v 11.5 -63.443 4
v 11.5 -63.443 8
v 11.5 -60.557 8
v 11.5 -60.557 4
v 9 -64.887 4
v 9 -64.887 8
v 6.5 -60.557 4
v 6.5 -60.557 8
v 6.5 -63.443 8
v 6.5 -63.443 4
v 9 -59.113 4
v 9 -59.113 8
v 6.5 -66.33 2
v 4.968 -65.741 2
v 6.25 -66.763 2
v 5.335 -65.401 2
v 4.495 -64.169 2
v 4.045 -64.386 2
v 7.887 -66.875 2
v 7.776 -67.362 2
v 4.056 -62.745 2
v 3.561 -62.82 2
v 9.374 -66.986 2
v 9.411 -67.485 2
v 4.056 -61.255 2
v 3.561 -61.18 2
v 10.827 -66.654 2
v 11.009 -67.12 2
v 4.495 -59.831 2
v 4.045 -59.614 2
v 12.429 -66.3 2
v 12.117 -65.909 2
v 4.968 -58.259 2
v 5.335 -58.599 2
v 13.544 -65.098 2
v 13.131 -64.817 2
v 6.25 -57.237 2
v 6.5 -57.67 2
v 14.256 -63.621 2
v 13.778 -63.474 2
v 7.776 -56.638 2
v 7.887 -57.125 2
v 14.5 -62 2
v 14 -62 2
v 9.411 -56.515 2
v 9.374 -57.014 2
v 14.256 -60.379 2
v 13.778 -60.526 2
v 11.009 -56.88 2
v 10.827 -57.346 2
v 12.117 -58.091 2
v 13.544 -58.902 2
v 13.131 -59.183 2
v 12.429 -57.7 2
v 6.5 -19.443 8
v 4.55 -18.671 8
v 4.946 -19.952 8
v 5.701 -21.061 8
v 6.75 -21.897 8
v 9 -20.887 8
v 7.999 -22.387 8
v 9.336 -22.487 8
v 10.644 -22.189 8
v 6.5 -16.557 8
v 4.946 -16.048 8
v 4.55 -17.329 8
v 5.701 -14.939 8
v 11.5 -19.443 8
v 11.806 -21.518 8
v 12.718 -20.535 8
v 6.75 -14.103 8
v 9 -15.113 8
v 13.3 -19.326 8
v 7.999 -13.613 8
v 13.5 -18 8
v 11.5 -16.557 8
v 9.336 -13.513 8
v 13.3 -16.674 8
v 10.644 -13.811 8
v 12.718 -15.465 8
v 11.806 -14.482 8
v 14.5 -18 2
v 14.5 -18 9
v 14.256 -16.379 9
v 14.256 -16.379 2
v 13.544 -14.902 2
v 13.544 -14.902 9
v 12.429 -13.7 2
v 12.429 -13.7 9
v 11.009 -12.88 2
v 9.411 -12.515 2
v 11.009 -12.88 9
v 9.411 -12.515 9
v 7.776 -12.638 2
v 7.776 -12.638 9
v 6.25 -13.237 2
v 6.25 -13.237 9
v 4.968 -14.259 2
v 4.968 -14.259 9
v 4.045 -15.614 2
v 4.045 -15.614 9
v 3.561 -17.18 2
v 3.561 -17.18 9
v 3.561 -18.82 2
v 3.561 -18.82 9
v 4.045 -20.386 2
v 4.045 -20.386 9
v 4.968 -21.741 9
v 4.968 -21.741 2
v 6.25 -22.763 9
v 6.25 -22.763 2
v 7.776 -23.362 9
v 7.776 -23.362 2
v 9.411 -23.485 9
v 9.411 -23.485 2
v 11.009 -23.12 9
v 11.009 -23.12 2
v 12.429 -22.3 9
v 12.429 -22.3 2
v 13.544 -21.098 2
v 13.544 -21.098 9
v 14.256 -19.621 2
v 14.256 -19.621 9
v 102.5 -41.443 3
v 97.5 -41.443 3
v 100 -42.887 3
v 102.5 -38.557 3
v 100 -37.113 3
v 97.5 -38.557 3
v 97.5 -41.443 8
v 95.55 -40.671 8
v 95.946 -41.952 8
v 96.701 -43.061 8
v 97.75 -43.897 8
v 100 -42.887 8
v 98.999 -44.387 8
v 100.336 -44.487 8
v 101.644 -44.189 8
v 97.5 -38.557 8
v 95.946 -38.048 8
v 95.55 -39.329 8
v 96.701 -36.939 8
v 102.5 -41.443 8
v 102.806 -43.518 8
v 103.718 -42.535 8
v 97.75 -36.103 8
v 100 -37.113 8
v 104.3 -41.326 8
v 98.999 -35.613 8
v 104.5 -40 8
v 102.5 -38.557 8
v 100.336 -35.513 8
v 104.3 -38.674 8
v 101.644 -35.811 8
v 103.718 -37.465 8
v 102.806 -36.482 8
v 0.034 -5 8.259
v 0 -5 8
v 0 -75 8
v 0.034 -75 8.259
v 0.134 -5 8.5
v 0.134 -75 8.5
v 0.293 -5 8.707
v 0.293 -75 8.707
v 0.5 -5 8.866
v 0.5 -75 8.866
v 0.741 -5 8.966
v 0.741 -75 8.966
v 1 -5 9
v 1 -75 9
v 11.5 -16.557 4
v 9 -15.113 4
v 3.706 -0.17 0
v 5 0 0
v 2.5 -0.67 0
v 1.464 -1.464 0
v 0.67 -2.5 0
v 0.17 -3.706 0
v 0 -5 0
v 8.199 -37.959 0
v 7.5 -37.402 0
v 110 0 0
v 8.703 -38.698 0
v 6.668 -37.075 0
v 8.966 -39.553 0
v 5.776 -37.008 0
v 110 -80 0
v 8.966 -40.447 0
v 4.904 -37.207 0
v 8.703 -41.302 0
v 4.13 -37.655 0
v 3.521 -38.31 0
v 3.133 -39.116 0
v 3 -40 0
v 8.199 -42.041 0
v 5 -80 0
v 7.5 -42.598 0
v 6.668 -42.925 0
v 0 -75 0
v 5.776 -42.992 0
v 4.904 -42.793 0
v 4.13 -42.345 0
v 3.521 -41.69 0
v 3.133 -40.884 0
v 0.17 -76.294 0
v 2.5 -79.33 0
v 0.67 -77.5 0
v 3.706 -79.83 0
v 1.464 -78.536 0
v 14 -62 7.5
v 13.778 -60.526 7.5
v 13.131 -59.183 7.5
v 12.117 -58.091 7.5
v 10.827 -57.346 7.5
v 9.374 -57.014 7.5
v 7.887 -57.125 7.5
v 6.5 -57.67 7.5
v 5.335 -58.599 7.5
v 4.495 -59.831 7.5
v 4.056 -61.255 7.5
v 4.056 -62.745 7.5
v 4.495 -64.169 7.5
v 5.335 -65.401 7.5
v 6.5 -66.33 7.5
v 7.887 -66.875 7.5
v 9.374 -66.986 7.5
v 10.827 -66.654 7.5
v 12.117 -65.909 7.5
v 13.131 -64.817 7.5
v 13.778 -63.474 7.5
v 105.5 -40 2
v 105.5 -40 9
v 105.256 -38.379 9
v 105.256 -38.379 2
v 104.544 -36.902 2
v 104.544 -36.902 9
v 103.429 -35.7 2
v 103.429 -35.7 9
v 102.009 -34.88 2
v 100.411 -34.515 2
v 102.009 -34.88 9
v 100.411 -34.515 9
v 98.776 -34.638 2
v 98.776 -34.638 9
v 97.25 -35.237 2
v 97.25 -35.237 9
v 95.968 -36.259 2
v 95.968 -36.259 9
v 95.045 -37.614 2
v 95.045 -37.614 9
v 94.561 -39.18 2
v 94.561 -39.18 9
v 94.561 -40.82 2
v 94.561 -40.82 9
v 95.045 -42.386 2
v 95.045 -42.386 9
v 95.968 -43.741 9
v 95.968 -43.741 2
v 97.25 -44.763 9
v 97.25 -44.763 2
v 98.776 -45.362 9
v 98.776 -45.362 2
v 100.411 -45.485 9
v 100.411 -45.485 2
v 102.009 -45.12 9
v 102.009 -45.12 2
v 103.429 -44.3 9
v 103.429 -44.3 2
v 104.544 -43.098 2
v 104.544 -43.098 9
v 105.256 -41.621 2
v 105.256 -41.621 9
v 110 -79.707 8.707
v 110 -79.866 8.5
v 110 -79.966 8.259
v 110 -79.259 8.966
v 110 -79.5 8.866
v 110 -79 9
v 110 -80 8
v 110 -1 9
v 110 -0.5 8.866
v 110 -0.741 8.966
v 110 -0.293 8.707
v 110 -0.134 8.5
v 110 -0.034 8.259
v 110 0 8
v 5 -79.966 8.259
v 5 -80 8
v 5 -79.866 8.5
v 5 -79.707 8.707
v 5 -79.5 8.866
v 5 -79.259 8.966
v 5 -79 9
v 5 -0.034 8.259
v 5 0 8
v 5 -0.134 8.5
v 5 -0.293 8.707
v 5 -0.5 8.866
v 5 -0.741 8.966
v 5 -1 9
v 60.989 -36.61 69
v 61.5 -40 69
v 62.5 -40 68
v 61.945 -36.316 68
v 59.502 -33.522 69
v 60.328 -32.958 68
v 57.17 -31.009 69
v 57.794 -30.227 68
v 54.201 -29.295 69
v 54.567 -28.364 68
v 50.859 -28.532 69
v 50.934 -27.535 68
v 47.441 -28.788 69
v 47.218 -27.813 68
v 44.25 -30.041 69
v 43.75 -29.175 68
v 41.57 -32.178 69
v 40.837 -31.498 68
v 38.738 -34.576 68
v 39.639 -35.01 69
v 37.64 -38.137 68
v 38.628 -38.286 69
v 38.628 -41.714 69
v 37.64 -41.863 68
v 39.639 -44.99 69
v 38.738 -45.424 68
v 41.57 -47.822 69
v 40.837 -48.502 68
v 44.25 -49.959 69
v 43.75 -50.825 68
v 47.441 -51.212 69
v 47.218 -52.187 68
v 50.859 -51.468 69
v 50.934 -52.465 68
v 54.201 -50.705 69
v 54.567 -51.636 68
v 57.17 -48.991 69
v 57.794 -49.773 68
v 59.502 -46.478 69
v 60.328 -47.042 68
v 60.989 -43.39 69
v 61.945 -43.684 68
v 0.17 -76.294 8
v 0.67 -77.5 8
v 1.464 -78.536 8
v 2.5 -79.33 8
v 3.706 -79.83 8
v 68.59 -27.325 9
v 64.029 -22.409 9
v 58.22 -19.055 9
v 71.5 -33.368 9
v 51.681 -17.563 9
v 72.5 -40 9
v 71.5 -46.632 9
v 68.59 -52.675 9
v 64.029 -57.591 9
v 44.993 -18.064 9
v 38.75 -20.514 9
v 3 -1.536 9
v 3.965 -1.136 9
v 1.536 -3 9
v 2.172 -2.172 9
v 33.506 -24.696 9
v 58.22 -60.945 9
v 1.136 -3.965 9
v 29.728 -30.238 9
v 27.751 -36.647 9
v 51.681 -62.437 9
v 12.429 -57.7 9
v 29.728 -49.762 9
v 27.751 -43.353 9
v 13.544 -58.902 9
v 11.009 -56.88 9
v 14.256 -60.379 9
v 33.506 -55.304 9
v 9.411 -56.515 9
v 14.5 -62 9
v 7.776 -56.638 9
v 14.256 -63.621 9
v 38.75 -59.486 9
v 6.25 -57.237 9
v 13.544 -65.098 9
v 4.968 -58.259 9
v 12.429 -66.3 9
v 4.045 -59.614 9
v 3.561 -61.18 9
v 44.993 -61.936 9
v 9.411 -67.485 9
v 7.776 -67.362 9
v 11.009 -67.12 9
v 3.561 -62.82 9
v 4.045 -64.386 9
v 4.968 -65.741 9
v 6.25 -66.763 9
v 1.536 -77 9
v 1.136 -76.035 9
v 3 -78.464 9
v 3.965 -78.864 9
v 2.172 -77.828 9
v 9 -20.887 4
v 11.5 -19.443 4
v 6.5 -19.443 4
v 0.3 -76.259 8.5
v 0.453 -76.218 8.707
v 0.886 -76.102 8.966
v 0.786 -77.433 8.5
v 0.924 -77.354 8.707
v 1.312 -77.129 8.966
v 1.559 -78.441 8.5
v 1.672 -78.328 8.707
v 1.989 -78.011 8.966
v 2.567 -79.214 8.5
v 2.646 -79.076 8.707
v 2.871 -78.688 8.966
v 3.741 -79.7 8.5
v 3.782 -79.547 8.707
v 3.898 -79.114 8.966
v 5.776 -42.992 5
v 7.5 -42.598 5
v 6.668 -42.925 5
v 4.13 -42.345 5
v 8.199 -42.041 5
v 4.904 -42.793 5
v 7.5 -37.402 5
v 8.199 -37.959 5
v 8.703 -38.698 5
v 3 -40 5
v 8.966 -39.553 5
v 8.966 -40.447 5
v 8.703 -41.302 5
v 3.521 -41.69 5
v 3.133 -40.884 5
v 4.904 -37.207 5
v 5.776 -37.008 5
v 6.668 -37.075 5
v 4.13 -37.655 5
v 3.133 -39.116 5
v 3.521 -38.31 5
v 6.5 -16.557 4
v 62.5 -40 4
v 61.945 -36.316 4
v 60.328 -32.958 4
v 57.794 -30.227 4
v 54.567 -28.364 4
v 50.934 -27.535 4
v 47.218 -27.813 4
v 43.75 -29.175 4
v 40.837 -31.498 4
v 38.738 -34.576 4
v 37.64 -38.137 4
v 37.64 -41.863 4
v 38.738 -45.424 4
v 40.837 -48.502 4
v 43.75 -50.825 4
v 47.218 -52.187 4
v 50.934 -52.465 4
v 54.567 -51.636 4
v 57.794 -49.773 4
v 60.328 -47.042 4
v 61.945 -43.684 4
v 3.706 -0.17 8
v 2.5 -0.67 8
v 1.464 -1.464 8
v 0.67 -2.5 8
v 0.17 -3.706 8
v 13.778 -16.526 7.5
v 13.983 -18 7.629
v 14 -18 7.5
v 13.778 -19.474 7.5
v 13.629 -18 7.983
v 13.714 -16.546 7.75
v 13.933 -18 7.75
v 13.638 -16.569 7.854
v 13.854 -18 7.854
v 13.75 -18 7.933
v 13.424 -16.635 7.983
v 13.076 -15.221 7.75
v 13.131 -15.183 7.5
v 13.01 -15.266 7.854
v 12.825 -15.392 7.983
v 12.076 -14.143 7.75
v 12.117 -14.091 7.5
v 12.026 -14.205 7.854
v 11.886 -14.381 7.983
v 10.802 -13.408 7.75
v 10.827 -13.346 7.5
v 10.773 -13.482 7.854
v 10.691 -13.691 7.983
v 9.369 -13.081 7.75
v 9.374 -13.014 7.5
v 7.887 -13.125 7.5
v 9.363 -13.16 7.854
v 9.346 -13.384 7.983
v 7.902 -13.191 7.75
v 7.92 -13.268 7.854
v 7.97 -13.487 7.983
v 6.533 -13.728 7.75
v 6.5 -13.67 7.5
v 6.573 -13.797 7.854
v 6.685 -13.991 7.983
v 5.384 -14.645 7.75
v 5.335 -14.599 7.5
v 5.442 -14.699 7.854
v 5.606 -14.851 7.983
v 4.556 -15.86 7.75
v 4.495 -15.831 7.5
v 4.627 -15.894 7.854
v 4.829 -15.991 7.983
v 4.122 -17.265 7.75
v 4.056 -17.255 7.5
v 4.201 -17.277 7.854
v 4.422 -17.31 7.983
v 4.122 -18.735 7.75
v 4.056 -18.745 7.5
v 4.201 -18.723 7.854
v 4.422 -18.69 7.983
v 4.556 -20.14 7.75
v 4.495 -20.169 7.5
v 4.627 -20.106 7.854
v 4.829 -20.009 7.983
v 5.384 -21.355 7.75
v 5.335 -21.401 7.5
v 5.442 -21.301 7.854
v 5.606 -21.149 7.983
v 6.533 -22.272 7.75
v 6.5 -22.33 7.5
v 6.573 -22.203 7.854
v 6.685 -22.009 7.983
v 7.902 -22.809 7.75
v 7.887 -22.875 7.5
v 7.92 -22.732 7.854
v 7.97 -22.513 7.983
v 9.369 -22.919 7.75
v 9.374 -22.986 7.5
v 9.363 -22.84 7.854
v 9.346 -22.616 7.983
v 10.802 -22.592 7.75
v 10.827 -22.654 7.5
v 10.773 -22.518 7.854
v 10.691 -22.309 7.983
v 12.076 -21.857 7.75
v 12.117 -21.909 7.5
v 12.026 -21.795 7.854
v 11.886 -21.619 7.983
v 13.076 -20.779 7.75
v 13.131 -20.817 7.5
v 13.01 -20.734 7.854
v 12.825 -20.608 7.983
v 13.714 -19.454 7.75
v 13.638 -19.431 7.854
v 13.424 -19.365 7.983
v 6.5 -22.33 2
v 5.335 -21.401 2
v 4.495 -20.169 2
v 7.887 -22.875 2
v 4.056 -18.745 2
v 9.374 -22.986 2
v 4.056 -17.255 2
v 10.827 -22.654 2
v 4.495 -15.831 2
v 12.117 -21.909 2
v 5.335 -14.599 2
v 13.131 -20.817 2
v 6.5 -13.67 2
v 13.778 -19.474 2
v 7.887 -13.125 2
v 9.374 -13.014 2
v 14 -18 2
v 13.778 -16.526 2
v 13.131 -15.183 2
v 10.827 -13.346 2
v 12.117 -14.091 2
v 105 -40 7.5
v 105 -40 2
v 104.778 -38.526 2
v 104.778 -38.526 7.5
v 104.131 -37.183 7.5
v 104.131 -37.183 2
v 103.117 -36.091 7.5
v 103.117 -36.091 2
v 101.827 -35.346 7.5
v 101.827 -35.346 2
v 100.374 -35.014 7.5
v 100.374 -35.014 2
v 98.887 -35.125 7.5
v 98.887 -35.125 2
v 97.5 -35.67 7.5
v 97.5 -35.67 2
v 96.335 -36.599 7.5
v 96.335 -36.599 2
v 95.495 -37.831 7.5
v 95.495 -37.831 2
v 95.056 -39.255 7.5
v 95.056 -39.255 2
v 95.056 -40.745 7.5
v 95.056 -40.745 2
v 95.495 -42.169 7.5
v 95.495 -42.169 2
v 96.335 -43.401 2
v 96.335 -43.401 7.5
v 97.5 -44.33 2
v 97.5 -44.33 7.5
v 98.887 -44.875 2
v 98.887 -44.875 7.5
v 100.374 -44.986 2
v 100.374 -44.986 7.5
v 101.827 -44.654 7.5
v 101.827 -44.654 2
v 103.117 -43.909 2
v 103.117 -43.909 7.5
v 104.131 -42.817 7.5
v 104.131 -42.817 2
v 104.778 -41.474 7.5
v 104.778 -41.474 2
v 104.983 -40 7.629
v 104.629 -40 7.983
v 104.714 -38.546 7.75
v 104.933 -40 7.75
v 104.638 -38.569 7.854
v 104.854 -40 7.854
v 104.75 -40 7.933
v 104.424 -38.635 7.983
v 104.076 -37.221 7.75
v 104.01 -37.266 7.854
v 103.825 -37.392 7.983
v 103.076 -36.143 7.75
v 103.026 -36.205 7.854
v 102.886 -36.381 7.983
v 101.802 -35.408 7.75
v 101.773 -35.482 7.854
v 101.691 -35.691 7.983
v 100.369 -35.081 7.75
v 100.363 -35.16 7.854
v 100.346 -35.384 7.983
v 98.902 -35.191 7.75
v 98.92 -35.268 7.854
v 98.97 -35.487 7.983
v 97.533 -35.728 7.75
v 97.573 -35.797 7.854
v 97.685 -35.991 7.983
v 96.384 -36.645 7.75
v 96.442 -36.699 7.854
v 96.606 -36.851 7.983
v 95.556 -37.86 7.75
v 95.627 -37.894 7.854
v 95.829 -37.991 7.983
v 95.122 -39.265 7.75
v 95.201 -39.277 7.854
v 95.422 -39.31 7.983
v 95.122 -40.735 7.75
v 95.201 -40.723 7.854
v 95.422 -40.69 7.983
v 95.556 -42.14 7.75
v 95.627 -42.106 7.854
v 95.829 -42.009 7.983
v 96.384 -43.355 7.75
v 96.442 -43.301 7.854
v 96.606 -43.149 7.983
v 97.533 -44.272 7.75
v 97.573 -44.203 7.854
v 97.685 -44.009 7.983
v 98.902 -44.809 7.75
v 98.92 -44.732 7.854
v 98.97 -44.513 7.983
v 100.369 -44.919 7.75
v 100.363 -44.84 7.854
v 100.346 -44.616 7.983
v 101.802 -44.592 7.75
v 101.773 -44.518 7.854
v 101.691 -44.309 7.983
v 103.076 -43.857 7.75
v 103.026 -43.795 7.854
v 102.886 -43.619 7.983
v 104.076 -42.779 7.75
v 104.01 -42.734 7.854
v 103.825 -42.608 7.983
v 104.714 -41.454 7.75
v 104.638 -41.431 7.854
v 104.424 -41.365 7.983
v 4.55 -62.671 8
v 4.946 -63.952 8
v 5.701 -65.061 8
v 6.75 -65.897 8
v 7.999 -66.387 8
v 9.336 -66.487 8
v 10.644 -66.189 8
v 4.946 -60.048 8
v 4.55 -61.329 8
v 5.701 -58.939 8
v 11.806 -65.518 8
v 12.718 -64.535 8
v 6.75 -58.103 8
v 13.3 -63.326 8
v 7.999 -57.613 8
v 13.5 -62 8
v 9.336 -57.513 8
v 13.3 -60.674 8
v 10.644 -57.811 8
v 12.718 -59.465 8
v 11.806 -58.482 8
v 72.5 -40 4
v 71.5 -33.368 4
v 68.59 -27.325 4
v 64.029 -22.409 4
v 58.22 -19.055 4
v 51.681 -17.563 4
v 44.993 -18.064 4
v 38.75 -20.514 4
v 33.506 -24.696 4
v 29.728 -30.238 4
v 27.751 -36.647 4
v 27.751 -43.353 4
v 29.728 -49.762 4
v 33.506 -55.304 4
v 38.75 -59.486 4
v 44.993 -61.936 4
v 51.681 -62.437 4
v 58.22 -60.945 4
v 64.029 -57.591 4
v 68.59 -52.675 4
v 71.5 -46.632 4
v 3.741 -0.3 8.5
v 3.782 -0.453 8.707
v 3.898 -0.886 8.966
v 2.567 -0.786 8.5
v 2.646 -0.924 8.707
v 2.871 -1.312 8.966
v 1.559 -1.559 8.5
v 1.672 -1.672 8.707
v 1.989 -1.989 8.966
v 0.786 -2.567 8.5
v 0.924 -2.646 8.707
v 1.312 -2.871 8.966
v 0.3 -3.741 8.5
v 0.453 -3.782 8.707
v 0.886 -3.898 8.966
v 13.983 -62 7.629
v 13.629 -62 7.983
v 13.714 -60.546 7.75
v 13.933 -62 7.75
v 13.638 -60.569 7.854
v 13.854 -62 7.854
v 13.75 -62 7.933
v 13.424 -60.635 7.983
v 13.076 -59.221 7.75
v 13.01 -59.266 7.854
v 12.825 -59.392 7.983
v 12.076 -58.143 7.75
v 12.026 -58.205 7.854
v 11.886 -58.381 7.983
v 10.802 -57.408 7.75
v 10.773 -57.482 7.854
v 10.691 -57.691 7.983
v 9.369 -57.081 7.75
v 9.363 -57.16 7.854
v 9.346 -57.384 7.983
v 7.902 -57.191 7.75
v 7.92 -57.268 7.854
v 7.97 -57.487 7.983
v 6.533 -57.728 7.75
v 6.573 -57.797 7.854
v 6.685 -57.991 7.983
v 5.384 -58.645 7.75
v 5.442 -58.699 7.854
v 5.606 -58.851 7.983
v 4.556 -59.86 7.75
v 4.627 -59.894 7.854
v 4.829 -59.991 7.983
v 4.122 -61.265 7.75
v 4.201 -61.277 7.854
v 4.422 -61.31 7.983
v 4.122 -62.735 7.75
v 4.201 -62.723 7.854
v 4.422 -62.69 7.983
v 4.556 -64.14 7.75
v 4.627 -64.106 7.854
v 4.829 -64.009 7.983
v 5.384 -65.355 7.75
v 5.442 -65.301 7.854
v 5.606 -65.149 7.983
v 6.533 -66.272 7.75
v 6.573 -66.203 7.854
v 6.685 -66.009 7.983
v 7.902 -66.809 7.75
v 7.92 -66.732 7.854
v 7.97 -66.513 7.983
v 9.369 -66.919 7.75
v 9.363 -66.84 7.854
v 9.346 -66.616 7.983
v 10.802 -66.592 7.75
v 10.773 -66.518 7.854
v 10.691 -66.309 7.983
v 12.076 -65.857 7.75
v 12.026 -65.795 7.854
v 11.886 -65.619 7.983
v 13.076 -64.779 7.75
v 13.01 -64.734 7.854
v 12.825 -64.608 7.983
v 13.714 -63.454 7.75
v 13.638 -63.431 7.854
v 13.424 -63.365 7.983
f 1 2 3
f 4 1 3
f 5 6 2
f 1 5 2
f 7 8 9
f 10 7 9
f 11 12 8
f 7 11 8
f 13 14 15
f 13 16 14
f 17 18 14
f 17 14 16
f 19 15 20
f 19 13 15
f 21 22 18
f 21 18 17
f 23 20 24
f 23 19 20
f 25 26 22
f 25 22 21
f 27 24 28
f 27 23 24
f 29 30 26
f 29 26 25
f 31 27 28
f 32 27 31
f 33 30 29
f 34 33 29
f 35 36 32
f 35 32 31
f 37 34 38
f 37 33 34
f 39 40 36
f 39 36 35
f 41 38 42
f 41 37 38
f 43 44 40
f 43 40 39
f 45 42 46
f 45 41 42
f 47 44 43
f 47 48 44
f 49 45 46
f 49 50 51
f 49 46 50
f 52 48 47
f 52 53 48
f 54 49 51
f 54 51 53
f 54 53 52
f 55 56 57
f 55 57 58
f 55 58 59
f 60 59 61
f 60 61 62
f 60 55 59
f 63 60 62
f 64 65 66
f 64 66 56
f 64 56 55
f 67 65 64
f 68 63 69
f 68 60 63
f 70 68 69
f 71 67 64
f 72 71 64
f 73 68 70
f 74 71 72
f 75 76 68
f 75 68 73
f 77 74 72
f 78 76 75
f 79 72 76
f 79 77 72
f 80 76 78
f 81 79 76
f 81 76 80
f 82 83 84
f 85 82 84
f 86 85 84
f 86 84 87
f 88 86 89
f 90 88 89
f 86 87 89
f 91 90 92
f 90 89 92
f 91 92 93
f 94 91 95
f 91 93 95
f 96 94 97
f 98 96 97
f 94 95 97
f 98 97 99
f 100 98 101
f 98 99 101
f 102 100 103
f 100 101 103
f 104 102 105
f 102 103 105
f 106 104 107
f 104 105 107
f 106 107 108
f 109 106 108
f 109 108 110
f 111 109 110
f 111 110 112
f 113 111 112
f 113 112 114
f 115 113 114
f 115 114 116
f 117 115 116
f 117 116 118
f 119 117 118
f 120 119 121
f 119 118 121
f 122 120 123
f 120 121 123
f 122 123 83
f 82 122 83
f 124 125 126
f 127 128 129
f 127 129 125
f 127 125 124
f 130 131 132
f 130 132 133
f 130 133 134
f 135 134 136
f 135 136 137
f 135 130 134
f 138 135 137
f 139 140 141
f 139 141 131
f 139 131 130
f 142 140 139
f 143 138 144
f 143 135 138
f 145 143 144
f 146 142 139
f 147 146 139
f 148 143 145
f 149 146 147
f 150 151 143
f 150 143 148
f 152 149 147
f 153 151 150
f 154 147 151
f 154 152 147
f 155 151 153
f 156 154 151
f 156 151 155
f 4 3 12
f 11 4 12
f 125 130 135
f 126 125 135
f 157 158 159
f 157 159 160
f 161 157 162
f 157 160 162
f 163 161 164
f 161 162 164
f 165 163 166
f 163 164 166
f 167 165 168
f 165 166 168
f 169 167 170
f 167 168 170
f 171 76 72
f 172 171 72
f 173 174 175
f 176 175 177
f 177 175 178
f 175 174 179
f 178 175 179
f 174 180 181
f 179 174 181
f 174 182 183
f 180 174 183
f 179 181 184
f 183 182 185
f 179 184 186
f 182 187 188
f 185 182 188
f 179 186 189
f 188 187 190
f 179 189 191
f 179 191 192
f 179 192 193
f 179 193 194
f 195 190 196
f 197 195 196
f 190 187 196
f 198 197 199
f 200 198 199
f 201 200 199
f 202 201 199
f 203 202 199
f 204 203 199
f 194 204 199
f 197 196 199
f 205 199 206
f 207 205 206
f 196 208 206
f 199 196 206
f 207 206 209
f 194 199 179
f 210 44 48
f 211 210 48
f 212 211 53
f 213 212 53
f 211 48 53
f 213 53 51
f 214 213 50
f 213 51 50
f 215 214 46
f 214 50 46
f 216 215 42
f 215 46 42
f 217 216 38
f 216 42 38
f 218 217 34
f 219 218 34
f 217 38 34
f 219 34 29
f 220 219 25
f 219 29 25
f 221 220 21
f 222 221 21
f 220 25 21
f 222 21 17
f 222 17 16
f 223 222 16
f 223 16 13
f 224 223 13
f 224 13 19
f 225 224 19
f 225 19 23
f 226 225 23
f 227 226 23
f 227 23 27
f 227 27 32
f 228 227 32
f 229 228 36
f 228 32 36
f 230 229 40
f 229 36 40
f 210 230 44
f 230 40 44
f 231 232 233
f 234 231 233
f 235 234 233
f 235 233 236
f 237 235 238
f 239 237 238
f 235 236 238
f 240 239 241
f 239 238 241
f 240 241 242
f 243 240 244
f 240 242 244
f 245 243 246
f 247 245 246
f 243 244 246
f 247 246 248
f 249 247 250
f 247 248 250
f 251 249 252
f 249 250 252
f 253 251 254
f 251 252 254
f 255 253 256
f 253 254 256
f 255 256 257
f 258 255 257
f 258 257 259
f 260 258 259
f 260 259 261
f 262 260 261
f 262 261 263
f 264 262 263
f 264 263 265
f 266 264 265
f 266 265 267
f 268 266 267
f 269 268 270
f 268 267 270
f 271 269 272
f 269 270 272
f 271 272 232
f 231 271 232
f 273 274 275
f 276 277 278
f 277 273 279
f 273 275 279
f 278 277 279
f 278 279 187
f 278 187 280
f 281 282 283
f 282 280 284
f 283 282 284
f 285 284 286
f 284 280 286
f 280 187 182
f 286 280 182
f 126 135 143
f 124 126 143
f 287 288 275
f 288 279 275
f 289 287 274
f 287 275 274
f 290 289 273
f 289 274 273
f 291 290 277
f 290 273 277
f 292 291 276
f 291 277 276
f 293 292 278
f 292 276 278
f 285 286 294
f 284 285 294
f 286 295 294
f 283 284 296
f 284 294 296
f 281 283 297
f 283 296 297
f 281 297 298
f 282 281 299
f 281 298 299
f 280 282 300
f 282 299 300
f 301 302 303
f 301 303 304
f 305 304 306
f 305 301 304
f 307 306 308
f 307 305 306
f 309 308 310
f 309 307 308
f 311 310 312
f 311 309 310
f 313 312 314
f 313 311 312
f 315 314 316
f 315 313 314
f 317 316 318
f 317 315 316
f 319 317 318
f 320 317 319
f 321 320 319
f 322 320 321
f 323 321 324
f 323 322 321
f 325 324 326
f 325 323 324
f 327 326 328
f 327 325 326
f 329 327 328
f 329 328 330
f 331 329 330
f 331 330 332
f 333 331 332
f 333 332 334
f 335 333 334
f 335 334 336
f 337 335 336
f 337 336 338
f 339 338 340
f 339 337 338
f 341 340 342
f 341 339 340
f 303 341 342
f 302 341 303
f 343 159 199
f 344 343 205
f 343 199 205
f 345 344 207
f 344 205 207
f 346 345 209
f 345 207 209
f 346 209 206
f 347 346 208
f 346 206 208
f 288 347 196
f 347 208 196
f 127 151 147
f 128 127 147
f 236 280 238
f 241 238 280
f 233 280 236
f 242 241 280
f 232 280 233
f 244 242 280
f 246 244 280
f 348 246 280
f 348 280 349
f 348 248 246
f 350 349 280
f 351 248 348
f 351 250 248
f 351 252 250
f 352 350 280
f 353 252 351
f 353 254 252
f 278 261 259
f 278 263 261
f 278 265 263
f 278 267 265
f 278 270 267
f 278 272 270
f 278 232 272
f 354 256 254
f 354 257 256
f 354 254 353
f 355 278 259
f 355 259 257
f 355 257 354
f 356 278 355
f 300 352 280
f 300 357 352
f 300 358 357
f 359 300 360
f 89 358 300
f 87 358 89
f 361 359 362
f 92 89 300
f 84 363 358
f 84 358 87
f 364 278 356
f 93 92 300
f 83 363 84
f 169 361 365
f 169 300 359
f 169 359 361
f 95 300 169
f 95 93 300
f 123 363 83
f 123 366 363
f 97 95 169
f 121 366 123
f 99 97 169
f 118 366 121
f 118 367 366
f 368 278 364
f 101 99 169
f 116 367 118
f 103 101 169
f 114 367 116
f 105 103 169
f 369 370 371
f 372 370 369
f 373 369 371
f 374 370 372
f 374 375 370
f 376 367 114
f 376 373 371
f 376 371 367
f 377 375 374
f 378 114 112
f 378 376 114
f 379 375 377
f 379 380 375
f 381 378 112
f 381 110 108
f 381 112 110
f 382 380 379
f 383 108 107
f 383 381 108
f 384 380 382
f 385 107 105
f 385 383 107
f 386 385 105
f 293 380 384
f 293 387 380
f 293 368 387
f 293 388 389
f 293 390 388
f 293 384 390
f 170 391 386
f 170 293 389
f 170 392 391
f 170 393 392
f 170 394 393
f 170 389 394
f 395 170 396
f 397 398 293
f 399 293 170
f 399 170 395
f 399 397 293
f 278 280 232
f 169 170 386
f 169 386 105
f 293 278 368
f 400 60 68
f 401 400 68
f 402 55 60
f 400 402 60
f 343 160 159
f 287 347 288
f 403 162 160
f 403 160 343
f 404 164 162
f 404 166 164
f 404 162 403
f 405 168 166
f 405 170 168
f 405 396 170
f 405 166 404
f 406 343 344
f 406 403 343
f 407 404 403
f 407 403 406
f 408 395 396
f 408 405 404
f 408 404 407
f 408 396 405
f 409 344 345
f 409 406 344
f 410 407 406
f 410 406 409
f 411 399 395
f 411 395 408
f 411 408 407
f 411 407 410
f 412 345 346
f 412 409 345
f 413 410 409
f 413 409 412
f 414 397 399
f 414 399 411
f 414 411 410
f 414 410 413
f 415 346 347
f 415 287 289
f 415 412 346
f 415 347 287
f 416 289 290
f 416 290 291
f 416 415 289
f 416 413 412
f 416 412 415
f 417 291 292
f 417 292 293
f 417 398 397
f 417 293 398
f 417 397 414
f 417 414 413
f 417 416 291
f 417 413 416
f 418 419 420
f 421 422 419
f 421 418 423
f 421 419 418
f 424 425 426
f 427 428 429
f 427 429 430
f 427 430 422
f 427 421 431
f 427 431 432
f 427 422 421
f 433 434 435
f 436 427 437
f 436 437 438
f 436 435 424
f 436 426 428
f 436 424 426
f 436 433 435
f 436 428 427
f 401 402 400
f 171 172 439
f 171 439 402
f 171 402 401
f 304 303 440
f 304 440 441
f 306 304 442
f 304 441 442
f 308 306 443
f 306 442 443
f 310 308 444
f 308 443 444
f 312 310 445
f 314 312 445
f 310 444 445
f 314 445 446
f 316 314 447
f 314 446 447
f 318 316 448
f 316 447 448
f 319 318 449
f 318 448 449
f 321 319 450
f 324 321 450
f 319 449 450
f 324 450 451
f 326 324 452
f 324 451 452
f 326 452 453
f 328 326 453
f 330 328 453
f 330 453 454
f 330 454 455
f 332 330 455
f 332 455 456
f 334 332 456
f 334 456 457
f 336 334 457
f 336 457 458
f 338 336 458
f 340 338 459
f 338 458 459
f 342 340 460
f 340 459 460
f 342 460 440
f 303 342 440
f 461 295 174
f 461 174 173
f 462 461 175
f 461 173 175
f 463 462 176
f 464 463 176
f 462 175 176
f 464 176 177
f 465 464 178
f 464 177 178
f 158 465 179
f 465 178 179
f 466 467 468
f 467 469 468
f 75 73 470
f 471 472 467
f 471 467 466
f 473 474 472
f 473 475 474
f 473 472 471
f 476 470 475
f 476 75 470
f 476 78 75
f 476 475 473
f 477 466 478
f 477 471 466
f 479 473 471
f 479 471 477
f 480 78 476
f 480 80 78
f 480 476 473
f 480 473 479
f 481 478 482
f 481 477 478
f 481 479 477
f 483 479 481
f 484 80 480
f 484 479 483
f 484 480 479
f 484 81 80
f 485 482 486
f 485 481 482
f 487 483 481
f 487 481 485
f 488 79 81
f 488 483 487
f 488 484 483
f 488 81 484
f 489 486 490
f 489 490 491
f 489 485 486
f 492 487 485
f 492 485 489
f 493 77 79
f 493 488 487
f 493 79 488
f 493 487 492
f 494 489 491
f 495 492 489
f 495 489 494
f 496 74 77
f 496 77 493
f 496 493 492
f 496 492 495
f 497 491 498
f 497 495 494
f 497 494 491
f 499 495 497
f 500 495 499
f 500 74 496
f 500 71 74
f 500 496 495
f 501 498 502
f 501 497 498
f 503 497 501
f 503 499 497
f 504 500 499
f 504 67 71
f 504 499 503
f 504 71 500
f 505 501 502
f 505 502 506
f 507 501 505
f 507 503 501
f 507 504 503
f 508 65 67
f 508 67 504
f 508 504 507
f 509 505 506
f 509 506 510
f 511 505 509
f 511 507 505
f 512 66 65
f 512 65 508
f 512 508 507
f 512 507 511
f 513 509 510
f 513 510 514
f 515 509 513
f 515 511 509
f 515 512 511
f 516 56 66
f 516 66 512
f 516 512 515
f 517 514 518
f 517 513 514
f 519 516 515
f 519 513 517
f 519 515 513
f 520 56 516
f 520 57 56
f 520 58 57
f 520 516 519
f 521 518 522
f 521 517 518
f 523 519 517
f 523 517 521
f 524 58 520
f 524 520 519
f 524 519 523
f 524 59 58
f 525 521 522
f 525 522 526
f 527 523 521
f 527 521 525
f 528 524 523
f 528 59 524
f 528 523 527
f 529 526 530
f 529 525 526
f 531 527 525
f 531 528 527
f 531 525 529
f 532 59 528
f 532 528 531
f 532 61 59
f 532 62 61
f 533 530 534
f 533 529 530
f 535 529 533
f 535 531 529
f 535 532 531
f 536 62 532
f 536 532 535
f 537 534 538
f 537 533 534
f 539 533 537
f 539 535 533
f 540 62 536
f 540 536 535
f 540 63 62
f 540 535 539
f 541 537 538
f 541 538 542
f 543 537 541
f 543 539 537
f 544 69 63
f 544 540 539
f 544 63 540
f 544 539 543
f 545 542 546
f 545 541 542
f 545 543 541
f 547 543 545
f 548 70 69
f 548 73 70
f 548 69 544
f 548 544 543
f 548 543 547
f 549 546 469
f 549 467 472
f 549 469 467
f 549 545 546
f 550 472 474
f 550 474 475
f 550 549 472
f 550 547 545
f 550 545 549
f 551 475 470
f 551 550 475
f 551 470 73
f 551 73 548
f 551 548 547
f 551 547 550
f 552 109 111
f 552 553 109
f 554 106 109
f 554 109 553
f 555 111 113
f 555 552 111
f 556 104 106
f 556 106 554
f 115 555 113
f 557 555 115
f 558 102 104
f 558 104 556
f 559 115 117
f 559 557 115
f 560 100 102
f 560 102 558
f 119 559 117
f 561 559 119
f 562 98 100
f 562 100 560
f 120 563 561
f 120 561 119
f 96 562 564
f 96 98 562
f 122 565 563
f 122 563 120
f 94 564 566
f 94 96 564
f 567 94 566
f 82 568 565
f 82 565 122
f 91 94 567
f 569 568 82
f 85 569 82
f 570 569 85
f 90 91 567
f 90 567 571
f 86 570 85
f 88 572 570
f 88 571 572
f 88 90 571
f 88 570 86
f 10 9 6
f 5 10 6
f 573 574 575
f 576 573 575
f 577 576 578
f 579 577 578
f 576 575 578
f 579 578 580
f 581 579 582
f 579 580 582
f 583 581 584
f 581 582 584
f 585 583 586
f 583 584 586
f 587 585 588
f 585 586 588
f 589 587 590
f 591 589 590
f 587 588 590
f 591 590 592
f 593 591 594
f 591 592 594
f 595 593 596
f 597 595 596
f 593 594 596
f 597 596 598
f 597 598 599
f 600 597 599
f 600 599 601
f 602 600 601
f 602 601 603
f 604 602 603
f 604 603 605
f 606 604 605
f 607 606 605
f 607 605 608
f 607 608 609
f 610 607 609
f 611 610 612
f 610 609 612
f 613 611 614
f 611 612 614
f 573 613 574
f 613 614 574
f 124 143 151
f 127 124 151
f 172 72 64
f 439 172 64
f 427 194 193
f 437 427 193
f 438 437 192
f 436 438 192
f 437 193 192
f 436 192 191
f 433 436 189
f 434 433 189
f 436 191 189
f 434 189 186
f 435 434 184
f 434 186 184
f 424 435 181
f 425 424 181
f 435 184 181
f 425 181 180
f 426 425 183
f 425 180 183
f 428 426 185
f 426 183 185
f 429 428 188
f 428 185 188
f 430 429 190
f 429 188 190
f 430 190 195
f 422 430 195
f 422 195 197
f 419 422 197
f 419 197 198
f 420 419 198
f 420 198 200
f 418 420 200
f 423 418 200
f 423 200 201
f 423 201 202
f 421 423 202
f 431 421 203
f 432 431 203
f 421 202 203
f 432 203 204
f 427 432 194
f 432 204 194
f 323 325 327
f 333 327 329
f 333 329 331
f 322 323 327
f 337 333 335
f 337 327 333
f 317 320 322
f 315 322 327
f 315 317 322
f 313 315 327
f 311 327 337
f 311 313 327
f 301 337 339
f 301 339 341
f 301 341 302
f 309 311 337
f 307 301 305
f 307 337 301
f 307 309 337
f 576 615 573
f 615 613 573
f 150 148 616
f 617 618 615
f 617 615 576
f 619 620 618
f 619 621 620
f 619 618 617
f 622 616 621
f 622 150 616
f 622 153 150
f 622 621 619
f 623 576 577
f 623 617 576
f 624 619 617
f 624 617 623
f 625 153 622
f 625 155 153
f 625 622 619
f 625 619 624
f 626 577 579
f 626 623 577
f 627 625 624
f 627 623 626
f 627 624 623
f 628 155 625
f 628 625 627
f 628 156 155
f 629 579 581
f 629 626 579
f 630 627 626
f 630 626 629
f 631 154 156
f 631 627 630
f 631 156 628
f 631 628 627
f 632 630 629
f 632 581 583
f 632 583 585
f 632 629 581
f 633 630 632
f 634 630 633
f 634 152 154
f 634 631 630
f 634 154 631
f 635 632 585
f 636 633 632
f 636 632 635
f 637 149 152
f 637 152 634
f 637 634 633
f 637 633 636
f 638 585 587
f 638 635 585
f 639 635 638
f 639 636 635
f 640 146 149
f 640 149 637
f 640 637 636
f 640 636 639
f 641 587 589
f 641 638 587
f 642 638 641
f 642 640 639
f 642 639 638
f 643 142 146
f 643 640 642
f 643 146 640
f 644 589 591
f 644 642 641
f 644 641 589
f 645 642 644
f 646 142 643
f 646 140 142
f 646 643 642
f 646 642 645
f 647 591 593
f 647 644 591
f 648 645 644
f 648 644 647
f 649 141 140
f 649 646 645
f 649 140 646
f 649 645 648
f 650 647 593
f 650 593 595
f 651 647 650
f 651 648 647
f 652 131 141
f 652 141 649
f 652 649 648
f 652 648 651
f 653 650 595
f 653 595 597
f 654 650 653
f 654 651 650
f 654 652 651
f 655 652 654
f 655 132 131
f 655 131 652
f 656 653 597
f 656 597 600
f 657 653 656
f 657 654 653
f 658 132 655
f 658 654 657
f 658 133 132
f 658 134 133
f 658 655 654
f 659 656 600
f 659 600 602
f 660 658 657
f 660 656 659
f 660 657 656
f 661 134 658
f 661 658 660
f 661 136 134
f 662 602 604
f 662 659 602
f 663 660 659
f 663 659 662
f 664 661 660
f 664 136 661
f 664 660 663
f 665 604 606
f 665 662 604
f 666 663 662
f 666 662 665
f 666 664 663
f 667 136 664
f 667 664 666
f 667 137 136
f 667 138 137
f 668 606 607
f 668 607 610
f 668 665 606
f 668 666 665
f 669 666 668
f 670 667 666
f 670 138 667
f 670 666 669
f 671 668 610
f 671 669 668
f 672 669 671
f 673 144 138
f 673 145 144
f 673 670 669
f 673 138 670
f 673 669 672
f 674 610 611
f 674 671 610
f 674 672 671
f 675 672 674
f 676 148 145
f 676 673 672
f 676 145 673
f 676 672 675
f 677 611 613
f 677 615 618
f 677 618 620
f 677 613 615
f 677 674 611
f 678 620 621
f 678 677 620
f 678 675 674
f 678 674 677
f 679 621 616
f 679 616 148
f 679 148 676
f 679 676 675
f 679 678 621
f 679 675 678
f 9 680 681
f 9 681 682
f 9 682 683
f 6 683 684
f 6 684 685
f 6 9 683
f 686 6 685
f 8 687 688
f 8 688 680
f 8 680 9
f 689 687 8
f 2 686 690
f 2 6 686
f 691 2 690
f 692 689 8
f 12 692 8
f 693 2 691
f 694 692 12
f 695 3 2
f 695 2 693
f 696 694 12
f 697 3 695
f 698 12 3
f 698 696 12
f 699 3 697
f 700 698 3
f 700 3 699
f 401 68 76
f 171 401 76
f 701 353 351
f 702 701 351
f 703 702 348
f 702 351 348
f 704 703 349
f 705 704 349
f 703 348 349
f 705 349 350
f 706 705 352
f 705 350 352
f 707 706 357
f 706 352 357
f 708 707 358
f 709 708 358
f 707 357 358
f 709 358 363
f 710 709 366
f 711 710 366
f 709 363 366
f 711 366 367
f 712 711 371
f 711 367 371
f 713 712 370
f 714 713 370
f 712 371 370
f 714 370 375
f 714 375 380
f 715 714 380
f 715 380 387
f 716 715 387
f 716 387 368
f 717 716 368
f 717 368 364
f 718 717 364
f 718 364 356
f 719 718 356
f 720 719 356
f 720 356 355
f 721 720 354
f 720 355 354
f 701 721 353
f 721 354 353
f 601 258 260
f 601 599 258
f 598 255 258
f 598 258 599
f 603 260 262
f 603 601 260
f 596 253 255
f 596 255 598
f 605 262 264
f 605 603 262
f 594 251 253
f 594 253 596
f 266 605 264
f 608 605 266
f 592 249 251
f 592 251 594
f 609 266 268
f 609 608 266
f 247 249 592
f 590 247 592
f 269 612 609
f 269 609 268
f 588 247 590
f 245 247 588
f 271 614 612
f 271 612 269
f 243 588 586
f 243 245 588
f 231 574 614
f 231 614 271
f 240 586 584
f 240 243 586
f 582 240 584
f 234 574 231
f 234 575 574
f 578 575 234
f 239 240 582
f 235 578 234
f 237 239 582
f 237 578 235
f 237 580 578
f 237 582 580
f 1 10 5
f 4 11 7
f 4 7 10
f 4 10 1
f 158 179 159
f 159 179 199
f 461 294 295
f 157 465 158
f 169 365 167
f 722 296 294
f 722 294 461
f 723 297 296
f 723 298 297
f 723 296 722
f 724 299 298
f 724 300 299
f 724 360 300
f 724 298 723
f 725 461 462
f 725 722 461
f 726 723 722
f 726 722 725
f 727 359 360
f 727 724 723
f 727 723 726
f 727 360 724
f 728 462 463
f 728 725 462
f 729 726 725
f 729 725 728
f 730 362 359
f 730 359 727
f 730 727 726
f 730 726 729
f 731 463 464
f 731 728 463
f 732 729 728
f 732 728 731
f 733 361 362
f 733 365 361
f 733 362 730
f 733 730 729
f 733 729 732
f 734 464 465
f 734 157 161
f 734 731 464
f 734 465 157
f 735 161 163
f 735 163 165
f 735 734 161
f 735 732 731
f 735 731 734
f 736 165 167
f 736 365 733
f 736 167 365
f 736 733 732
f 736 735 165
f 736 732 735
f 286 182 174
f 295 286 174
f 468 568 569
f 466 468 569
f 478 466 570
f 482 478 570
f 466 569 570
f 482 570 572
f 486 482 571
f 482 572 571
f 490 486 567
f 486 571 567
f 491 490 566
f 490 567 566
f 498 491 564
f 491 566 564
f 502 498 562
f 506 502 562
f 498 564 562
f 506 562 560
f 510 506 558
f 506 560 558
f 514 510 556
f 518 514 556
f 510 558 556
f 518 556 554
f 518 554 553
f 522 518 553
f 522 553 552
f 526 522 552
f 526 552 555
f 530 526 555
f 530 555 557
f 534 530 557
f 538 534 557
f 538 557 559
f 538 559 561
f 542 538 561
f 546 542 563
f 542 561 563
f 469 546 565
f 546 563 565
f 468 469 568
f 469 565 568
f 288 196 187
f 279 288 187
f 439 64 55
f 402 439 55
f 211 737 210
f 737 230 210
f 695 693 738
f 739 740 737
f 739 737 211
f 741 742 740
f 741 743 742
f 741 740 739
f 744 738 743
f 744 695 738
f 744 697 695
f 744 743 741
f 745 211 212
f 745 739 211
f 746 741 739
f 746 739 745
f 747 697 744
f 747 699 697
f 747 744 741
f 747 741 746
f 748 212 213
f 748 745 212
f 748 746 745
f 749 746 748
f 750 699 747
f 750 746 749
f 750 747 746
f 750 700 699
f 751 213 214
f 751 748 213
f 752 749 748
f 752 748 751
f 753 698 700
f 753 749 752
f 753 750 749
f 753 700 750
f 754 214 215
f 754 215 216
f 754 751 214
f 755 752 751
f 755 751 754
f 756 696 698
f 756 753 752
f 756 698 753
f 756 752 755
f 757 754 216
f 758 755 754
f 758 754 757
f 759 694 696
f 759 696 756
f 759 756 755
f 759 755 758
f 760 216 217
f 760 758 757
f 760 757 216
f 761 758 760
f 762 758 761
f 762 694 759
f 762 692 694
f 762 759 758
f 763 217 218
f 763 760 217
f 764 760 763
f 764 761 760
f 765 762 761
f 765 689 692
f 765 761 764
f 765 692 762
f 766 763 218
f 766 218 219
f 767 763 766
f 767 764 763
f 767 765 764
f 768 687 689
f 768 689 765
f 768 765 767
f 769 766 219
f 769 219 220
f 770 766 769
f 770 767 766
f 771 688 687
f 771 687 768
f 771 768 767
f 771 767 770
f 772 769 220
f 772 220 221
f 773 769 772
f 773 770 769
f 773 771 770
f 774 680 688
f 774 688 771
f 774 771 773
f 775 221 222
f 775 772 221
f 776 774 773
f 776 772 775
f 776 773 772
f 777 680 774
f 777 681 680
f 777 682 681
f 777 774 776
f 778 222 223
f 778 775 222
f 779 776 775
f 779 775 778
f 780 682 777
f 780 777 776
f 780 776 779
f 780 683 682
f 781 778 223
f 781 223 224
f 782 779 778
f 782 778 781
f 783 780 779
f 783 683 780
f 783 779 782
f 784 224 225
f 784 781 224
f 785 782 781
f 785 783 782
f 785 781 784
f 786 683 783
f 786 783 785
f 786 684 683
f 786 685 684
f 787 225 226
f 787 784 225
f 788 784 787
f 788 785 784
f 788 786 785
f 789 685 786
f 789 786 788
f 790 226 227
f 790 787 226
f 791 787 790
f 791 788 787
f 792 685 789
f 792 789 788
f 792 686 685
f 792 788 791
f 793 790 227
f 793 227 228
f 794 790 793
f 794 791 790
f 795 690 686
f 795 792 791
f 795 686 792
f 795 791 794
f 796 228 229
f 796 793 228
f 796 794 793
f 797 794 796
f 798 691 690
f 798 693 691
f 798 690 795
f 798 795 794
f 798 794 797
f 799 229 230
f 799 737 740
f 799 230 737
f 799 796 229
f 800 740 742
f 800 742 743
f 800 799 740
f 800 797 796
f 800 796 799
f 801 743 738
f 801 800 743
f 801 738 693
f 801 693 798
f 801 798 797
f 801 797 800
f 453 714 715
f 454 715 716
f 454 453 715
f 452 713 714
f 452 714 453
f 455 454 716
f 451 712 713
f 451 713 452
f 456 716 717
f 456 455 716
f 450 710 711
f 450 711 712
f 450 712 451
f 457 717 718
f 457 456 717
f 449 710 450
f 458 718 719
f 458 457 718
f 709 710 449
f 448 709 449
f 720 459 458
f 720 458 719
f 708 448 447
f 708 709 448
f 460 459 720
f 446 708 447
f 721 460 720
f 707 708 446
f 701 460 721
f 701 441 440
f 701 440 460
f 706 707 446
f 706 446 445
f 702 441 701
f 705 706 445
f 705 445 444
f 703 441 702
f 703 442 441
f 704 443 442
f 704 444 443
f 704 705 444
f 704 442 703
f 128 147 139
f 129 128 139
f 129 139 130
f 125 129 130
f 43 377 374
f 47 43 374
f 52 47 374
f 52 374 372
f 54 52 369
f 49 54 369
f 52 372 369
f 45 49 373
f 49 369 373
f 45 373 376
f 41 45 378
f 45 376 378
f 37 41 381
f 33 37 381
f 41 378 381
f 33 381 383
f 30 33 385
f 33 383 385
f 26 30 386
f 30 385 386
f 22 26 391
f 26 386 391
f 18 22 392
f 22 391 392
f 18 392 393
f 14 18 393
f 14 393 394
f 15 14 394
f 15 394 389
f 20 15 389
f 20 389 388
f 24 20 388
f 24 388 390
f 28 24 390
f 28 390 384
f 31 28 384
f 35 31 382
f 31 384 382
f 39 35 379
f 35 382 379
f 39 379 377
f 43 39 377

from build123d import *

# Parameters (mm, degrees)
BOSS_EXTRU_1_DEPTH               = 9
CONG_1_R                         = 1
ESQUISSE4_R                      = 5.5
ENL_V_MAT_EXTRU_1_DEPTH          = 7
ESQUISSE5_R                      = 5
BOSS_EXTRU_2_DEPTH               = 6
CONG_2_R                         = 0.5
ENL_V_MAT_EXTRU_2_DEPTH          = 4
R_P_TITION_LIN_AIRE1_COUNT       = 2
R_P_TITION_LIN_AIRE1_PITCH       = 44
CONG_2_OF_R_P_TITION_LIN_AIRE1_R = 0.5
ESQUISSE7_R                      = 5.5
ENL_V_MAT_EXTRU_3_DEPTH          = 7
ESQUISSE8_R                      = 5
BOSS_EXTRU_3_DEPTH               = 6
CONG_3_R                         = 0.5
ENL_V_MAT_EXTRU_4_DEPTH          = 5
ESQUISSE10_R                     = 3
ENL_V_MAT_EXTRU_5_DEPTH          = 5
ESQUISSE12_R                     = 22.5
ENL_V_MAT_EXTRU_7_DEPTH          = 5
ESQUISSE14_R                     = 12.5
BOSS_EXTRU_4_DEPTH               = 65
CHANFREIN1_SIZE                  = 1


with BuildPart() as part:
    # Esquisse1 → Boss.-Extru.1 (new body)
    with BuildSketch(Plane(origin=(0, 0, 0), x_dir=(-1, 0, 0), z_dir=(0, 0, 1))):
        with BuildLine():
            Line((0, 5), (0, 75))
            ThreePointArc((0, 75), (-1.464466094, 78.535533906), (-5, 80))
            Line((-5, 80), (-110, 80))
            Line((-110, 80), (-110, 0))
            Line((-110, 0), (-5, 0))
            ThreePointArc((-5, 0), (-1.464466094, 1.464466094), (0, 5))
        make_face()
    extrude(amount=BOSS_EXTRU_1_DEPTH)

    # Congé1
    cong_1_edges = [part.edges().sort_by_distance(p)[0] for p in [
        (1.464466094, -78.535533906, 9),
        (57.5, -80, 9),
        (57.5, 0, 9),
        (1.464466094, -1.464466094, 9),
        (0, -40, 9),
    ]]
    fillet(cong_1_edges, radius=CONG_1_R)

    # Esquisse4 → Enlèv. mat.-Extru.1 (cut)
    with BuildSketch(Plane.XY.offset(9)):
        with Locations((9, -18)):
            Circle(ESQUISSE4_R)
    enl_v_mat_extru_1 = extrude(amount=-ENL_V_MAT_EXTRU_1_DEPTH, mode=Mode.SUBTRACT)

    # Esquisse5 → Boss.-Extru.2 (add)
    with BuildSketch(Plane.XY.offset(2)):
        with Locations((9, -18)):
            Circle(ESQUISSE5_R)
    boss_extru_2 = extrude(amount=BOSS_EXTRU_2_DEPTH)

    # Congé2
    cong_2_edges = [part.edges().sort_by_distance(p)[0] for p in [
        (4, -18, 8),
    ]]
    fillet(cong_2_edges, radius=CONG_2_R)

    # Esquisse6 → Enlèv. mat.-Extru.2 (cut)
    with BuildSketch(Plane.XY.offset(8)):
        Polygon((9, -15.113248654), (6.5, -16.556624327), (6.5, -19.443375673), (9, -20.886751346), (11.5, -19.443375673), (11.5, -16.556624327), align=None)
    enl_v_mat_extru_2 = extrude(amount=-ENL_V_MAT_EXTRU_2_DEPTH, mode=Mode.SUBTRACT)

    # Répétition linéaire1: Enlèv. mat.-Extru.1, Boss.-Extru.2, Enlèv. mat.-Extru.2 ×2
    with Locations(*[(0, -i * R_P_TITION_LIN_AIRE1_PITCH, 0) for i in range(1, R_P_TITION_LIN_AIRE1_COUNT)]):
        add(enl_v_mat_extru_1, mode=Mode.SUBTRACT)
        add(boss_extru_2)
        add(enl_v_mat_extru_2, mode=Mode.SUBTRACT)

    # Congé2 of Répétition linéaire1
    cong_2_of_r_p_tition_lin_aire1_edges = [part.edges().sort_by_distance(p)[0] for p in [
        (4, -62, 8),
    ]]
    fillet(cong_2_of_r_p_tition_lin_aire1_edges, radius=CONG_2_OF_R_P_TITION_LIN_AIRE1_R)

    # Esquisse7 → Enlèv. mat.-Extru.3 (cut)
    with BuildSketch(Plane.XY.offset(9)):
        with Locations((100, -40)):
            Circle(ESQUISSE7_R)
    extrude(amount=-ENL_V_MAT_EXTRU_3_DEPTH, mode=Mode.SUBTRACT)

    # Esquisse8 → Boss.-Extru.3 (add)
    with BuildSketch(Plane.XY.offset(2)):
        with Locations((100, -40)):
            Circle(ESQUISSE8_R)
    extrude(amount=BOSS_EXTRU_3_DEPTH)

    # Congé3
    cong_3_edges = [part.edges().sort_by_distance(p)[0] for p in [
        (95, -40, 8),
    ]]
    fillet(cong_3_edges, radius=CONG_3_R)

    # Esquisse9 → Enlèv. mat.-Extru.4 (cut)
    with BuildSketch(Plane.XY.offset(8)):
        Polygon((100, -37.113248654), (97.5, -38.556624327), (97.5, -41.443375673), (100, -42.886751346), (102.5, -41.443375673), (102.5, -38.556624327), align=None)
    extrude(amount=-ENL_V_MAT_EXTRU_4_DEPTH, mode=Mode.SUBTRACT)

    # Esquisse10 → Enlèv. mat.-Extru.5 (cut)
    with BuildSketch(Plane(origin=(0, 0, 0), x_dir=(-1, 0, 0), z_dir=(0, 0, -1))):
        with Locations((-6, -40)):
            Circle(ESQUISSE10_R)
    extrude(amount=-ENL_V_MAT_EXTRU_5_DEPTH, mode=Mode.SUBTRACT)

    # Esquisse12 → Enlèv. mat.-Extru.7 (cut)
    with BuildSketch(Plane.XY.offset(9)):
        with Locations((50, -40)):
            Circle(ESQUISSE12_R)
    extrude(amount=-ENL_V_MAT_EXTRU_7_DEPTH, mode=Mode.SUBTRACT)

    # Esquisse14 → Boss.-Extru.4 (add)
    with BuildSketch(Plane.XY.offset(4)):
        with Locations((50, -40)):
            Circle(ESQUISSE14_R)
    extrude(amount=BOSS_EXTRU_4_DEPTH)

    # Chanfrein1
    chanfrein1_edges = [part.edges().sort_by_distance(p)[0] for p in [
        (37.5, -40, 69),
    ]]
    chamfer(chanfrein1_edges, length=CHANFREIN1_SIZE)


solid = part.part
